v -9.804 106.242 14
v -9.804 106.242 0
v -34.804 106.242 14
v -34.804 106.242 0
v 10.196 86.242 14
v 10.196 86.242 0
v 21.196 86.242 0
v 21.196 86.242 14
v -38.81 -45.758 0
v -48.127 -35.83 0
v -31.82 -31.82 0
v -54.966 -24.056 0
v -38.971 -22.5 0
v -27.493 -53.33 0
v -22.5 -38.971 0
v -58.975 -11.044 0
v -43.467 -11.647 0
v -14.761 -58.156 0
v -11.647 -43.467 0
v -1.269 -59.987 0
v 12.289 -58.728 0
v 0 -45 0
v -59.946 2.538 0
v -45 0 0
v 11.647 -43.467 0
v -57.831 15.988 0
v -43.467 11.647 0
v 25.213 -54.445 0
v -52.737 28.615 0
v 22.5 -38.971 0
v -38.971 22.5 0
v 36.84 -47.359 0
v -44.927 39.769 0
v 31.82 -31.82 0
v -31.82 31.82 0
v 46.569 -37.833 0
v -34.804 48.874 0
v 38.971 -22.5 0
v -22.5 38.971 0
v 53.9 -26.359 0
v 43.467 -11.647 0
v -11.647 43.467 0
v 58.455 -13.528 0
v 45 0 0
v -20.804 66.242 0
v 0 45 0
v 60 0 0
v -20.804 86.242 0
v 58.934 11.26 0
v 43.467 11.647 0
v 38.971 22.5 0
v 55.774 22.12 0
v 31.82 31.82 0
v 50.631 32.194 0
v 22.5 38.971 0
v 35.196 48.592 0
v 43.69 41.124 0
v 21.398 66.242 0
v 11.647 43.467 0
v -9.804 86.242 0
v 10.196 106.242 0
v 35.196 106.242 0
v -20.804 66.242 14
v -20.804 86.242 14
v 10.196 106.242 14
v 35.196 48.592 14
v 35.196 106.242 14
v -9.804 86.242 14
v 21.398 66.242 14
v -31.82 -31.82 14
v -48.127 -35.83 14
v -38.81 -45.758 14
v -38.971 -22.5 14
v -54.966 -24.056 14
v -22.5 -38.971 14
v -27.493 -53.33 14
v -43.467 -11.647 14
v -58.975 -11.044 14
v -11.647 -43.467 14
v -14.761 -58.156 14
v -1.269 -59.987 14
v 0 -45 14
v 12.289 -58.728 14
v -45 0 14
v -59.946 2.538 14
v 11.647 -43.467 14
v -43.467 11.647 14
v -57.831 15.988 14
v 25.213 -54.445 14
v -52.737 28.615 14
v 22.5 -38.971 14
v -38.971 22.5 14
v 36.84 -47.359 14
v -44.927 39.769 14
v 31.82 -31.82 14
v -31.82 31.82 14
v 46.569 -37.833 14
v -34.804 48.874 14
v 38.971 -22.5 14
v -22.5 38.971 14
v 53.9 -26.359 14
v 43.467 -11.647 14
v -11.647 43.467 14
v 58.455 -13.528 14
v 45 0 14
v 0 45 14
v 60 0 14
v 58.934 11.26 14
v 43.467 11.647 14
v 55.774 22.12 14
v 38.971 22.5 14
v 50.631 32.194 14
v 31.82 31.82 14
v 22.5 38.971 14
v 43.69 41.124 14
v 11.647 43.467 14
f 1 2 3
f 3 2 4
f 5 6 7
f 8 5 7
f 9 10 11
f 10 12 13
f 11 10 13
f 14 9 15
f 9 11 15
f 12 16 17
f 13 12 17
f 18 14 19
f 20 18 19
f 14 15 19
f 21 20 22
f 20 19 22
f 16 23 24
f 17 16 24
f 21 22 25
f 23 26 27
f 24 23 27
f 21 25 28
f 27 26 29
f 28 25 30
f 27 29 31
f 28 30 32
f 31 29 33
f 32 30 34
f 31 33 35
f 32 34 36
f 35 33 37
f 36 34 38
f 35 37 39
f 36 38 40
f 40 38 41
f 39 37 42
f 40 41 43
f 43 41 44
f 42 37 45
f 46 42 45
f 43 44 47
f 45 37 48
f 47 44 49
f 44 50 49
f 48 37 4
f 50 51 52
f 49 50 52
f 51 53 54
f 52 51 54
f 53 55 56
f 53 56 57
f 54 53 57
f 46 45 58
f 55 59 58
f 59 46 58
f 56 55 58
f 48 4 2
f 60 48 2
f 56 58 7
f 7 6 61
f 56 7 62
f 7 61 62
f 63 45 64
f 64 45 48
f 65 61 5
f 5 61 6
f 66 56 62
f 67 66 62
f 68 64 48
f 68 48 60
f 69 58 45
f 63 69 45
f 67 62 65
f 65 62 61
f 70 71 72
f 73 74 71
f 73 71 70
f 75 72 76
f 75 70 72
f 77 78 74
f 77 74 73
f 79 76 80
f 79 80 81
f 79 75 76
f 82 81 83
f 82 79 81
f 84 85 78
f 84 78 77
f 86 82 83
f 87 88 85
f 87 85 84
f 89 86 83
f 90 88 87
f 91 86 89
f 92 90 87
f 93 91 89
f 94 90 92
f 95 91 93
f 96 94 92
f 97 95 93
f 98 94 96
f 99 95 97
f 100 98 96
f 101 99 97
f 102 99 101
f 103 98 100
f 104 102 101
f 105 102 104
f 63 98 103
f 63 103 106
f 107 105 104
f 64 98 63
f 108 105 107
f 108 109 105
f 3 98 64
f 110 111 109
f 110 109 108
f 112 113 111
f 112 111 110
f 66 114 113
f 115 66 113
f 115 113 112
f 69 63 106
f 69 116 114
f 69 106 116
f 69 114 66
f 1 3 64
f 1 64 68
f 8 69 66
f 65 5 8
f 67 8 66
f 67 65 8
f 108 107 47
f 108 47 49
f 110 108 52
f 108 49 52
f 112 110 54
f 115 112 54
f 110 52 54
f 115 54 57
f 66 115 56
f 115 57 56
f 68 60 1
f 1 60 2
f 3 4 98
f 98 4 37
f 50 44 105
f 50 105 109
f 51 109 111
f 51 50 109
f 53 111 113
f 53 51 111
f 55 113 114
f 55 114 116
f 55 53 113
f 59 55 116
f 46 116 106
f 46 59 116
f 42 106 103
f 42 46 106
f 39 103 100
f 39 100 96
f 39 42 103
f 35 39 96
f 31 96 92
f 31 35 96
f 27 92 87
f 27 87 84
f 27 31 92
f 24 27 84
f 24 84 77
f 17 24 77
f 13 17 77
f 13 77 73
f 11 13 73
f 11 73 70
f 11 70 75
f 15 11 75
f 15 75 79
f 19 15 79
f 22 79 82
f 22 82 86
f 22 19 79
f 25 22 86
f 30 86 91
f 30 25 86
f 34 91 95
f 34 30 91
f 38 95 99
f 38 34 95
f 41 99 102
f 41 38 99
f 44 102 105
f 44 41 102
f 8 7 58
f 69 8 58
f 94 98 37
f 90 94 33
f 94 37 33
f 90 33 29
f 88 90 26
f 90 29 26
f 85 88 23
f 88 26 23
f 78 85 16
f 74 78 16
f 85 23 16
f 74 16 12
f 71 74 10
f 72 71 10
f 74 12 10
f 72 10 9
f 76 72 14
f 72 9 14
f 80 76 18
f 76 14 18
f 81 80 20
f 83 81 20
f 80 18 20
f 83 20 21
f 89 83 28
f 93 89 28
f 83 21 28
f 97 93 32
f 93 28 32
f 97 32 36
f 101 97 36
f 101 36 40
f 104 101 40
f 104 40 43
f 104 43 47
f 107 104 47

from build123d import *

# Parameters (mm, degrees)
F0_R     = 45
F1_DEPTH = 14


with BuildPart() as f1:
    # F0 (on Top) → F1 (new body)
    with BuildSketch(Plane.XY):
        with BuildLine():
            ThreePointArc((-34.8038087036, 48.8742764624), (-27.493376273, -53.3302377747), (60, 0))
            ThreePointArc((60, 0), (53.4404878242, 27.2784578213), (35.1961912964, 48.5924697688))
            Line((35.1961912964, 48.5924697688), (-34.8038087036, 48.5924697688))
            Line((-34.8038087036, 48.5924697688), (-34.8038087036, 48.8742764624))
        make_face()
        Circle(F0_R, mode=Mode.SUBTRACT)
        with BuildLine():
            Line((-34.8038087036, 48.5924697688), (35.1961912964, 48.5924697688))
            ThreePointArc((35.1961912964, 48.5924697688), (0.2415466371, 59.9995137915), (-34.8038087036, 48.8742764624))
            Line((-34.8038087036, 48.8742764624), (-34.8038087036, 48.5924697688))
        make_face()
        with BuildLine():
            ThreePointArc((-34.8038087036, 48.8742764624), (0.2415466371, 59.9995137915), (35.1961912964, 48.5924697688))
            Line((35.1961912964, 48.5924697688), (35.1961912964, 66.2418827415))
            Line((35.1961912964, 66.2418827415), (21.3984008878, 66.2418827415))
            Line((21.3984008878, 66.2418827415), (-20.8038087036, 66.2418827415))
            Line((-20.8038087036, 66.2418827415), (-34.8038087036, 66.2418827415))
            Line((-34.8038087036, 66.2418827415), (-34.8038087036, 48.8742764624))
        make_face()
        Polygon((21.3984008878, 66.2418827415), (35.1961912964, 66.2418827415), (35.1961912964, 106.2418827415), (10.1961912964, 106.2418827415), (10.1961912964, 86.2418827415), (21.1961912964, 86.2418827415), align=None)
        Polygon((-34.8038087036, 106.2418827415), (-34.8038087036, 66.2418827415), (-20.8038087036, 66.2418827415), (-20.8038087036, 86.2418827415), (-9.8038087036, 86.2418827415), (-9.8038087036, 106.2418827415), align=None)
    extrude(amount=F1_DEPTH)


solid = f1.part
